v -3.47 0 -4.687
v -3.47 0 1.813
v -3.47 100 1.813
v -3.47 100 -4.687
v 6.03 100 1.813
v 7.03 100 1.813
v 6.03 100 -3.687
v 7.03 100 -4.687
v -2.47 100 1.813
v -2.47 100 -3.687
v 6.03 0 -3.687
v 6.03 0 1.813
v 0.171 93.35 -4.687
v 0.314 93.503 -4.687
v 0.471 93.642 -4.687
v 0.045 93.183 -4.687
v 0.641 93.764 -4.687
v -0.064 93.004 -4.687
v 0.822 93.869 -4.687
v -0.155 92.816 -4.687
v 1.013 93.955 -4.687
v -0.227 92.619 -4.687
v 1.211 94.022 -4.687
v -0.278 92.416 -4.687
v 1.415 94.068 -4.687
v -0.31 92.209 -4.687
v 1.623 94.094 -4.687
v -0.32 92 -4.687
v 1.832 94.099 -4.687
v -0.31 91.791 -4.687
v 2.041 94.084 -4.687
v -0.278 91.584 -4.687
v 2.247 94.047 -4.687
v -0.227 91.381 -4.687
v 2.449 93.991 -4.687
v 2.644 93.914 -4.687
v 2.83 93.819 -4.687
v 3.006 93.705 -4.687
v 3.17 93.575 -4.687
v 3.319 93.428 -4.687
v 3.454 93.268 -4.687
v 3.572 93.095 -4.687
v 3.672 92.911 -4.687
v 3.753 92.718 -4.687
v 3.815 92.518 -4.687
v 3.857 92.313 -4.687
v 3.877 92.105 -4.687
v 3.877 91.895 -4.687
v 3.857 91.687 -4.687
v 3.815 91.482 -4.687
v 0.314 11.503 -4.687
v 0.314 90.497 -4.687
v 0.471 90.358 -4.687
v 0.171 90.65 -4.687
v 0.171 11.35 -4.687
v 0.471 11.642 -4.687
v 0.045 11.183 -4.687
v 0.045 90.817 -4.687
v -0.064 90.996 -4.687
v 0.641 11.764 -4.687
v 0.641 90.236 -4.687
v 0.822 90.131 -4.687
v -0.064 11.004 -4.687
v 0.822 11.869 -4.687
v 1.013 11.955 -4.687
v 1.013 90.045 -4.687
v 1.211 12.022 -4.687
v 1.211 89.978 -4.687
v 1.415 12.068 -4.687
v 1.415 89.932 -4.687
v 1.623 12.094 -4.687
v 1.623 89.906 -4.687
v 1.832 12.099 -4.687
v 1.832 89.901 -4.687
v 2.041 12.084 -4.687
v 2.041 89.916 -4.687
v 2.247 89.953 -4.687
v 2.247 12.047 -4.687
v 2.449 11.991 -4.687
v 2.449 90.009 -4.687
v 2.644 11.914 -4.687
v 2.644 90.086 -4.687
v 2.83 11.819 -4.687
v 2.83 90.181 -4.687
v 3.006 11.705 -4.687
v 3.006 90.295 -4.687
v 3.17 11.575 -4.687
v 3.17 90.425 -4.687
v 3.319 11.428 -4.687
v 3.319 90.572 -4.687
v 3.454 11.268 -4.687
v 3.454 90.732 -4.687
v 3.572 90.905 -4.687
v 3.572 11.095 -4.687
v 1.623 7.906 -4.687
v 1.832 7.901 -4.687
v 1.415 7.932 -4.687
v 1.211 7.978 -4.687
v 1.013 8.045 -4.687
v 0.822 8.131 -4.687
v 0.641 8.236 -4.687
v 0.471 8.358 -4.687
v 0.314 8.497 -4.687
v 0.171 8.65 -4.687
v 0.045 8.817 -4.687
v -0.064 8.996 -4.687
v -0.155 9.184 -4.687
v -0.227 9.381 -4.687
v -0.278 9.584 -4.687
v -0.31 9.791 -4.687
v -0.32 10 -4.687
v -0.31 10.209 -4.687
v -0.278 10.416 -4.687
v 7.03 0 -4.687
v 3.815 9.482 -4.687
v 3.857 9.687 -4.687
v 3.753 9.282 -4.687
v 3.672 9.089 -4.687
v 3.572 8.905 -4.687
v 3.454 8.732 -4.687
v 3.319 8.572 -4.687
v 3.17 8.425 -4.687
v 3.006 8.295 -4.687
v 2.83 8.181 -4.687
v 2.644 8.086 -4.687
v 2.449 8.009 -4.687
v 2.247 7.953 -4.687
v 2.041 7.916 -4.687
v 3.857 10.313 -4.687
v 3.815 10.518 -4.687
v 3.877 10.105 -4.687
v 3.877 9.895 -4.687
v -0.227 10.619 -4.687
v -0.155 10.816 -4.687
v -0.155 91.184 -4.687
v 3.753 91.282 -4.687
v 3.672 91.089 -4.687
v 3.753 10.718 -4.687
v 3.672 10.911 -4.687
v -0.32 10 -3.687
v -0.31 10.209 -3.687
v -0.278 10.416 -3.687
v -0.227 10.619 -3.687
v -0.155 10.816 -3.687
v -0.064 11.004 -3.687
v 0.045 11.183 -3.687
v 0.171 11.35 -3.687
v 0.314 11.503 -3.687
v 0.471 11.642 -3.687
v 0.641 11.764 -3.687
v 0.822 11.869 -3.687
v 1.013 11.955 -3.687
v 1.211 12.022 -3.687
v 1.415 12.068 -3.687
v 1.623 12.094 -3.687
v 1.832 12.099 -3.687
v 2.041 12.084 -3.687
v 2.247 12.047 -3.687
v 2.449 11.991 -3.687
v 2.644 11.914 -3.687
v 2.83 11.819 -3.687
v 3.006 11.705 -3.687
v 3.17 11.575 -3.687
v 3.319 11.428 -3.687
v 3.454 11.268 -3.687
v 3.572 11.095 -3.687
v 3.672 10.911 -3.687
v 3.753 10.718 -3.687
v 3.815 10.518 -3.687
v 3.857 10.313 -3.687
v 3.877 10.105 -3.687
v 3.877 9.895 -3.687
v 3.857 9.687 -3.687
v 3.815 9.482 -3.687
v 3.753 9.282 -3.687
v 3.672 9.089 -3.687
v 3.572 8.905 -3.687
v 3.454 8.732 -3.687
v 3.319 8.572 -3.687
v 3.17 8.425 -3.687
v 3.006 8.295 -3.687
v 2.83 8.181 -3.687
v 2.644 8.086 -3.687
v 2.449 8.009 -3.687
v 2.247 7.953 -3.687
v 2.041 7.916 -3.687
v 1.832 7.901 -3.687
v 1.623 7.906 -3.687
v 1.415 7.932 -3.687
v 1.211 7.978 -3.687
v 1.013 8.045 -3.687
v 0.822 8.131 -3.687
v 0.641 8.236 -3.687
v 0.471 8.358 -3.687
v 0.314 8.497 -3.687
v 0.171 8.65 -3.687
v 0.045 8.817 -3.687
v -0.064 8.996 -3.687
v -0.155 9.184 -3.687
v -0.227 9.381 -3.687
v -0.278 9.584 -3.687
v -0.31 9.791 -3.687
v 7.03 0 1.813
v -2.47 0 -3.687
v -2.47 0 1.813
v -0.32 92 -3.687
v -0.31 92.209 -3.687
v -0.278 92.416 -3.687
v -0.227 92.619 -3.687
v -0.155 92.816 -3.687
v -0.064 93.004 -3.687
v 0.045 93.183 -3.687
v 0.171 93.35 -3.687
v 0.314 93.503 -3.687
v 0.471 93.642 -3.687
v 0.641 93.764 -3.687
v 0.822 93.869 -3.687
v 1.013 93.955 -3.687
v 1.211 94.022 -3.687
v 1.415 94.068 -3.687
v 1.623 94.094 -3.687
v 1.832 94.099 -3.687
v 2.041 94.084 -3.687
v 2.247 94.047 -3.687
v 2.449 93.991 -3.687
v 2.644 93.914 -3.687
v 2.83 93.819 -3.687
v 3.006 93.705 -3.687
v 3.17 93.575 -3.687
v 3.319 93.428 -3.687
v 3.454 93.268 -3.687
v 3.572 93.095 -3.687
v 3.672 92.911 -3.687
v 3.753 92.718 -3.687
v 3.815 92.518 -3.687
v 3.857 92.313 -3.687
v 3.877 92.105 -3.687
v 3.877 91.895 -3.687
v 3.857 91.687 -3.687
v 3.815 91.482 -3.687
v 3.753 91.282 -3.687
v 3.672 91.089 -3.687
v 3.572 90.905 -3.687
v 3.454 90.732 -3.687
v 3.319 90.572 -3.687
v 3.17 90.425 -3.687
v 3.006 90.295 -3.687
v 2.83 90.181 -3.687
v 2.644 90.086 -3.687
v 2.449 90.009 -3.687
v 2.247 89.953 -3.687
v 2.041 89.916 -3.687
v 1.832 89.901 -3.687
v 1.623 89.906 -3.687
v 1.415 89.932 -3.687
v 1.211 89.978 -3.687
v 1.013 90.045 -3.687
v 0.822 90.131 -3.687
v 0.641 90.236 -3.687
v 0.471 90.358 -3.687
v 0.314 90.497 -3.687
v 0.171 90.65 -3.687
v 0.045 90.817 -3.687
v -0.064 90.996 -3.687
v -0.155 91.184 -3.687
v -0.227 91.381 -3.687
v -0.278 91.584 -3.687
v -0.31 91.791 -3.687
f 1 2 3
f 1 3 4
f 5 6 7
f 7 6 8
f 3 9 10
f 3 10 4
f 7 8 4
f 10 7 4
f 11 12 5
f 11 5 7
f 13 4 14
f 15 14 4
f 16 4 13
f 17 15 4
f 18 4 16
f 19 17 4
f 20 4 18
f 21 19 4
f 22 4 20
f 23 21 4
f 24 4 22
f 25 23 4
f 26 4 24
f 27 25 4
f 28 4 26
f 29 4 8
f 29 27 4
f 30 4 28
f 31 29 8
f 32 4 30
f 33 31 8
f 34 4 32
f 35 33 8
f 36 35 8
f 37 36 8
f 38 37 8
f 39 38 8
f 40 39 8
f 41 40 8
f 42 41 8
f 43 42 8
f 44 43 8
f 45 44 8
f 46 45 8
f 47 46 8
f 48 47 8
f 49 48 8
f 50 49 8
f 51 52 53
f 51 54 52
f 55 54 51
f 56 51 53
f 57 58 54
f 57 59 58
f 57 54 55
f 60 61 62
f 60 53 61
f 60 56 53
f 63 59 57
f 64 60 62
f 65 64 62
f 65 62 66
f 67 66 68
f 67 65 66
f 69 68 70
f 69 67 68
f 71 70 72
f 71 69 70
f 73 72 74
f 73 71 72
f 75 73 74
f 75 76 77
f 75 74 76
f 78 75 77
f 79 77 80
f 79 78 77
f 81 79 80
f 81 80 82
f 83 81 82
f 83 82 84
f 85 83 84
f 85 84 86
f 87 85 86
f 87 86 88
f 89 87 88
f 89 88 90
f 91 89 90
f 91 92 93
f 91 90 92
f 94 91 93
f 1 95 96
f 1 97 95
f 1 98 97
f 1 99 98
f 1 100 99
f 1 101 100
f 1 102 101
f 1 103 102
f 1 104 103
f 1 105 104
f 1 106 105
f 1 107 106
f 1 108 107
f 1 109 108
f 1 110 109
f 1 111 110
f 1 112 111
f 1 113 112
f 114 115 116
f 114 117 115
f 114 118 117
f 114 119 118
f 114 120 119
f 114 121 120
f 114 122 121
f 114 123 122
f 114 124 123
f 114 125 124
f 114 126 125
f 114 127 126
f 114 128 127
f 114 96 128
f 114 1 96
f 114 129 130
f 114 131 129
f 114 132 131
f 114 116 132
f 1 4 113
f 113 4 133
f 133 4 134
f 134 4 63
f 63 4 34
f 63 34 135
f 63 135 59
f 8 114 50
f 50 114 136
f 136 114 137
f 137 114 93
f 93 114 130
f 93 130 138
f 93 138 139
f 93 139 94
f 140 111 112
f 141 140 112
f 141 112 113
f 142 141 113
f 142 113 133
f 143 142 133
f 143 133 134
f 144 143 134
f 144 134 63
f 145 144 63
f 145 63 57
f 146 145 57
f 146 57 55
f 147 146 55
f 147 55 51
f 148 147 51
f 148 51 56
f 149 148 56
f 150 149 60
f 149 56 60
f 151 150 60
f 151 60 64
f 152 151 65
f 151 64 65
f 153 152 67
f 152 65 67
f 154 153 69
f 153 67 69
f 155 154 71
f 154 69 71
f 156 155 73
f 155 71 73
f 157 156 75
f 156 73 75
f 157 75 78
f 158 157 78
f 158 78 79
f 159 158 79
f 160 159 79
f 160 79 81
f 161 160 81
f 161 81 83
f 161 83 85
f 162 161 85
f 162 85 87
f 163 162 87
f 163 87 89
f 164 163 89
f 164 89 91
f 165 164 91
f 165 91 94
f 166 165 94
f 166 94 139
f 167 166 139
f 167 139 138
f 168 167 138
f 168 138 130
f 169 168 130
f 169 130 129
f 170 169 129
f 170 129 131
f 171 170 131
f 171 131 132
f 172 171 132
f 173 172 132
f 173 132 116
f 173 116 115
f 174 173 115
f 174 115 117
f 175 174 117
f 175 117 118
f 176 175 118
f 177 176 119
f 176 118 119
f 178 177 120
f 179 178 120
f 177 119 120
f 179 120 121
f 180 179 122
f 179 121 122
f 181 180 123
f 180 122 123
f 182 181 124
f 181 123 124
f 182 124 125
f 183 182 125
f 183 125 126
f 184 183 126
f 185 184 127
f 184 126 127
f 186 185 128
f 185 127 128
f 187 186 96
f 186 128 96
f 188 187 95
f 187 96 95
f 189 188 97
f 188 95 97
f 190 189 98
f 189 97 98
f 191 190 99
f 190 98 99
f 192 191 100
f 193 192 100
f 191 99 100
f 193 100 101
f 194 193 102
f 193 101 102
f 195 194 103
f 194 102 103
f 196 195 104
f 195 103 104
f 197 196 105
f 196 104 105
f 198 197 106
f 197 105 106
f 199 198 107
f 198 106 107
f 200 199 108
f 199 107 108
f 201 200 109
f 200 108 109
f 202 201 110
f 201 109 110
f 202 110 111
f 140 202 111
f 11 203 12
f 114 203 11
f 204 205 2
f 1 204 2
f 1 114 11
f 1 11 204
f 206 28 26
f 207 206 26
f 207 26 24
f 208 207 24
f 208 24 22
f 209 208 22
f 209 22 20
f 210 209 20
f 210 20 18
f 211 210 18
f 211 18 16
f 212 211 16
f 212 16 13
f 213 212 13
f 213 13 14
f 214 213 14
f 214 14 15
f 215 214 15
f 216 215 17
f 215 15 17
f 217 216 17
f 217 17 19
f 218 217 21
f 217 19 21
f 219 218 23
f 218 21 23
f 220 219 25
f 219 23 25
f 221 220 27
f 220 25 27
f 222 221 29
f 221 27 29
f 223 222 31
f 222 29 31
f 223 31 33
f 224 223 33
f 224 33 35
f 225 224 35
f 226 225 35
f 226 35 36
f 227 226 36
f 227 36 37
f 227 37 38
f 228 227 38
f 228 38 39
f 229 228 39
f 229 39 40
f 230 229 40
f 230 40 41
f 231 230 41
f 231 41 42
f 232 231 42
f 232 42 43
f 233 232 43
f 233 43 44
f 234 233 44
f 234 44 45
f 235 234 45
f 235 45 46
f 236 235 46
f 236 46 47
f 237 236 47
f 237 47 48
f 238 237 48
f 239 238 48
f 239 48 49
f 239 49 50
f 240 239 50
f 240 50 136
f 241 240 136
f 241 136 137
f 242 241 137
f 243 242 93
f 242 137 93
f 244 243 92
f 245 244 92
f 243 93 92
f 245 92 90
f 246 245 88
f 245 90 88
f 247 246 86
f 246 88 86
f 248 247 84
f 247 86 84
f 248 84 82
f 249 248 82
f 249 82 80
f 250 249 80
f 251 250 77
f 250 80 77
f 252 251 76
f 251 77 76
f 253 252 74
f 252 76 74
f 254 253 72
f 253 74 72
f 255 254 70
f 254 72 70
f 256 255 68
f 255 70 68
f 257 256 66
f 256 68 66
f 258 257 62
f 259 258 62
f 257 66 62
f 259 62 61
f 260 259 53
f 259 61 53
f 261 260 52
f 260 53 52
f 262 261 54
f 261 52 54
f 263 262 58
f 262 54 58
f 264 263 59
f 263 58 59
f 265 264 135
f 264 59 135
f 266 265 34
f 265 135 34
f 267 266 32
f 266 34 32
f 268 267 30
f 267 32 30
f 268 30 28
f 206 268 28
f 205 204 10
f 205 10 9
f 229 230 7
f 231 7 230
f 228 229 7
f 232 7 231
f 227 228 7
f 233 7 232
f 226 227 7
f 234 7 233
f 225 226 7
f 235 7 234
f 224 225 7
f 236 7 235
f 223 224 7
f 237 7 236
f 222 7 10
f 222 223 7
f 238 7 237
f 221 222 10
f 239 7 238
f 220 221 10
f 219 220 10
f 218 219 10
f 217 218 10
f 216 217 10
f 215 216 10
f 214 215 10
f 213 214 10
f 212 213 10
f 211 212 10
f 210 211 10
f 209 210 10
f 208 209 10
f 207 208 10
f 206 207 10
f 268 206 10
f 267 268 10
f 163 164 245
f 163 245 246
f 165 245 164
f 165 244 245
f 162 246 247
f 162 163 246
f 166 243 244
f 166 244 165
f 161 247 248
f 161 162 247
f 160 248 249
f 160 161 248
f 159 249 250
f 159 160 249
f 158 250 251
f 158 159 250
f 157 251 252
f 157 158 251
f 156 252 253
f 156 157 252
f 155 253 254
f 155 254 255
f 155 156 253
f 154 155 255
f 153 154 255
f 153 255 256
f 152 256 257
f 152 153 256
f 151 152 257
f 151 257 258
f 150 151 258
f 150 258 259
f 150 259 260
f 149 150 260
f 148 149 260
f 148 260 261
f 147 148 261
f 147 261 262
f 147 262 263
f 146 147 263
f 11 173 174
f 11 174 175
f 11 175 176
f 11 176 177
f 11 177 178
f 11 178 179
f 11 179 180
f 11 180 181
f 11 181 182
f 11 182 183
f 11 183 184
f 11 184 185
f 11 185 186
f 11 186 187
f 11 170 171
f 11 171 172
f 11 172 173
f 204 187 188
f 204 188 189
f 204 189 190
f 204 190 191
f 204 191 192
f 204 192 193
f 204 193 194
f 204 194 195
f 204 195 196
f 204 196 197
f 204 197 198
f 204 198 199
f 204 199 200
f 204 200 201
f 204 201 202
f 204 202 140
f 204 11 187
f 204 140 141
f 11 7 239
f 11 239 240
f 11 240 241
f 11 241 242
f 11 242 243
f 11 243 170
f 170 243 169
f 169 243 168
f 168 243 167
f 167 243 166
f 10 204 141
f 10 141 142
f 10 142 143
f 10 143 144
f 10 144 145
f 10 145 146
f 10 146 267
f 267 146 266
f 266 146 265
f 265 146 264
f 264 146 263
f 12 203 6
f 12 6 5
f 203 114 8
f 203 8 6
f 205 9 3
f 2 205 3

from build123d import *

# Parameters (mm, degrees)
EXTRUDE_THIN1_DEPTH = 100
SKETCH2_R           = 2.1
CUT_EXTRUDE1_DEPTH  = 10


with BuildPart() as part:
    # Sketch1 → Extrude-Thin1 (new body)
    with BuildSketch(Plane(origin=(0, 0, 0), x_dir=(1, 0, 0), z_dir=(0, 1, 0))):
        Polygon((-3.469957082, -1.813304721), (-3.469957082, 4.686695279), (7.030042918, 4.686695279), (7.030042918, -1.813304721), (6.030042918, -1.813304721), (6.030042918, 3.686695279), (-2.469957082, 3.686695279), (-2.469957082, -1.813304721), align=None)
    extrude(amount=EXTRUDE_THIN1_DEPTH)

    # Sketch2 → Cut-Extrude1 (cut)
    with BuildSketch(Plane(origin=(0, 0, -4.686695279), x_dir=(-1, 0, 0), z_dir=(0, 0, -1))):
        with Locations((-1.780042918, 92)):
            Circle(SKETCH2_R)
        with Locations((-1.780042918, 10)):
            Circle(SKETCH2_R)
    extrude(amount=-CUT_EXTRUDE1_DEPTH, mode=Mode.SUBTRACT)


solid = part.part
